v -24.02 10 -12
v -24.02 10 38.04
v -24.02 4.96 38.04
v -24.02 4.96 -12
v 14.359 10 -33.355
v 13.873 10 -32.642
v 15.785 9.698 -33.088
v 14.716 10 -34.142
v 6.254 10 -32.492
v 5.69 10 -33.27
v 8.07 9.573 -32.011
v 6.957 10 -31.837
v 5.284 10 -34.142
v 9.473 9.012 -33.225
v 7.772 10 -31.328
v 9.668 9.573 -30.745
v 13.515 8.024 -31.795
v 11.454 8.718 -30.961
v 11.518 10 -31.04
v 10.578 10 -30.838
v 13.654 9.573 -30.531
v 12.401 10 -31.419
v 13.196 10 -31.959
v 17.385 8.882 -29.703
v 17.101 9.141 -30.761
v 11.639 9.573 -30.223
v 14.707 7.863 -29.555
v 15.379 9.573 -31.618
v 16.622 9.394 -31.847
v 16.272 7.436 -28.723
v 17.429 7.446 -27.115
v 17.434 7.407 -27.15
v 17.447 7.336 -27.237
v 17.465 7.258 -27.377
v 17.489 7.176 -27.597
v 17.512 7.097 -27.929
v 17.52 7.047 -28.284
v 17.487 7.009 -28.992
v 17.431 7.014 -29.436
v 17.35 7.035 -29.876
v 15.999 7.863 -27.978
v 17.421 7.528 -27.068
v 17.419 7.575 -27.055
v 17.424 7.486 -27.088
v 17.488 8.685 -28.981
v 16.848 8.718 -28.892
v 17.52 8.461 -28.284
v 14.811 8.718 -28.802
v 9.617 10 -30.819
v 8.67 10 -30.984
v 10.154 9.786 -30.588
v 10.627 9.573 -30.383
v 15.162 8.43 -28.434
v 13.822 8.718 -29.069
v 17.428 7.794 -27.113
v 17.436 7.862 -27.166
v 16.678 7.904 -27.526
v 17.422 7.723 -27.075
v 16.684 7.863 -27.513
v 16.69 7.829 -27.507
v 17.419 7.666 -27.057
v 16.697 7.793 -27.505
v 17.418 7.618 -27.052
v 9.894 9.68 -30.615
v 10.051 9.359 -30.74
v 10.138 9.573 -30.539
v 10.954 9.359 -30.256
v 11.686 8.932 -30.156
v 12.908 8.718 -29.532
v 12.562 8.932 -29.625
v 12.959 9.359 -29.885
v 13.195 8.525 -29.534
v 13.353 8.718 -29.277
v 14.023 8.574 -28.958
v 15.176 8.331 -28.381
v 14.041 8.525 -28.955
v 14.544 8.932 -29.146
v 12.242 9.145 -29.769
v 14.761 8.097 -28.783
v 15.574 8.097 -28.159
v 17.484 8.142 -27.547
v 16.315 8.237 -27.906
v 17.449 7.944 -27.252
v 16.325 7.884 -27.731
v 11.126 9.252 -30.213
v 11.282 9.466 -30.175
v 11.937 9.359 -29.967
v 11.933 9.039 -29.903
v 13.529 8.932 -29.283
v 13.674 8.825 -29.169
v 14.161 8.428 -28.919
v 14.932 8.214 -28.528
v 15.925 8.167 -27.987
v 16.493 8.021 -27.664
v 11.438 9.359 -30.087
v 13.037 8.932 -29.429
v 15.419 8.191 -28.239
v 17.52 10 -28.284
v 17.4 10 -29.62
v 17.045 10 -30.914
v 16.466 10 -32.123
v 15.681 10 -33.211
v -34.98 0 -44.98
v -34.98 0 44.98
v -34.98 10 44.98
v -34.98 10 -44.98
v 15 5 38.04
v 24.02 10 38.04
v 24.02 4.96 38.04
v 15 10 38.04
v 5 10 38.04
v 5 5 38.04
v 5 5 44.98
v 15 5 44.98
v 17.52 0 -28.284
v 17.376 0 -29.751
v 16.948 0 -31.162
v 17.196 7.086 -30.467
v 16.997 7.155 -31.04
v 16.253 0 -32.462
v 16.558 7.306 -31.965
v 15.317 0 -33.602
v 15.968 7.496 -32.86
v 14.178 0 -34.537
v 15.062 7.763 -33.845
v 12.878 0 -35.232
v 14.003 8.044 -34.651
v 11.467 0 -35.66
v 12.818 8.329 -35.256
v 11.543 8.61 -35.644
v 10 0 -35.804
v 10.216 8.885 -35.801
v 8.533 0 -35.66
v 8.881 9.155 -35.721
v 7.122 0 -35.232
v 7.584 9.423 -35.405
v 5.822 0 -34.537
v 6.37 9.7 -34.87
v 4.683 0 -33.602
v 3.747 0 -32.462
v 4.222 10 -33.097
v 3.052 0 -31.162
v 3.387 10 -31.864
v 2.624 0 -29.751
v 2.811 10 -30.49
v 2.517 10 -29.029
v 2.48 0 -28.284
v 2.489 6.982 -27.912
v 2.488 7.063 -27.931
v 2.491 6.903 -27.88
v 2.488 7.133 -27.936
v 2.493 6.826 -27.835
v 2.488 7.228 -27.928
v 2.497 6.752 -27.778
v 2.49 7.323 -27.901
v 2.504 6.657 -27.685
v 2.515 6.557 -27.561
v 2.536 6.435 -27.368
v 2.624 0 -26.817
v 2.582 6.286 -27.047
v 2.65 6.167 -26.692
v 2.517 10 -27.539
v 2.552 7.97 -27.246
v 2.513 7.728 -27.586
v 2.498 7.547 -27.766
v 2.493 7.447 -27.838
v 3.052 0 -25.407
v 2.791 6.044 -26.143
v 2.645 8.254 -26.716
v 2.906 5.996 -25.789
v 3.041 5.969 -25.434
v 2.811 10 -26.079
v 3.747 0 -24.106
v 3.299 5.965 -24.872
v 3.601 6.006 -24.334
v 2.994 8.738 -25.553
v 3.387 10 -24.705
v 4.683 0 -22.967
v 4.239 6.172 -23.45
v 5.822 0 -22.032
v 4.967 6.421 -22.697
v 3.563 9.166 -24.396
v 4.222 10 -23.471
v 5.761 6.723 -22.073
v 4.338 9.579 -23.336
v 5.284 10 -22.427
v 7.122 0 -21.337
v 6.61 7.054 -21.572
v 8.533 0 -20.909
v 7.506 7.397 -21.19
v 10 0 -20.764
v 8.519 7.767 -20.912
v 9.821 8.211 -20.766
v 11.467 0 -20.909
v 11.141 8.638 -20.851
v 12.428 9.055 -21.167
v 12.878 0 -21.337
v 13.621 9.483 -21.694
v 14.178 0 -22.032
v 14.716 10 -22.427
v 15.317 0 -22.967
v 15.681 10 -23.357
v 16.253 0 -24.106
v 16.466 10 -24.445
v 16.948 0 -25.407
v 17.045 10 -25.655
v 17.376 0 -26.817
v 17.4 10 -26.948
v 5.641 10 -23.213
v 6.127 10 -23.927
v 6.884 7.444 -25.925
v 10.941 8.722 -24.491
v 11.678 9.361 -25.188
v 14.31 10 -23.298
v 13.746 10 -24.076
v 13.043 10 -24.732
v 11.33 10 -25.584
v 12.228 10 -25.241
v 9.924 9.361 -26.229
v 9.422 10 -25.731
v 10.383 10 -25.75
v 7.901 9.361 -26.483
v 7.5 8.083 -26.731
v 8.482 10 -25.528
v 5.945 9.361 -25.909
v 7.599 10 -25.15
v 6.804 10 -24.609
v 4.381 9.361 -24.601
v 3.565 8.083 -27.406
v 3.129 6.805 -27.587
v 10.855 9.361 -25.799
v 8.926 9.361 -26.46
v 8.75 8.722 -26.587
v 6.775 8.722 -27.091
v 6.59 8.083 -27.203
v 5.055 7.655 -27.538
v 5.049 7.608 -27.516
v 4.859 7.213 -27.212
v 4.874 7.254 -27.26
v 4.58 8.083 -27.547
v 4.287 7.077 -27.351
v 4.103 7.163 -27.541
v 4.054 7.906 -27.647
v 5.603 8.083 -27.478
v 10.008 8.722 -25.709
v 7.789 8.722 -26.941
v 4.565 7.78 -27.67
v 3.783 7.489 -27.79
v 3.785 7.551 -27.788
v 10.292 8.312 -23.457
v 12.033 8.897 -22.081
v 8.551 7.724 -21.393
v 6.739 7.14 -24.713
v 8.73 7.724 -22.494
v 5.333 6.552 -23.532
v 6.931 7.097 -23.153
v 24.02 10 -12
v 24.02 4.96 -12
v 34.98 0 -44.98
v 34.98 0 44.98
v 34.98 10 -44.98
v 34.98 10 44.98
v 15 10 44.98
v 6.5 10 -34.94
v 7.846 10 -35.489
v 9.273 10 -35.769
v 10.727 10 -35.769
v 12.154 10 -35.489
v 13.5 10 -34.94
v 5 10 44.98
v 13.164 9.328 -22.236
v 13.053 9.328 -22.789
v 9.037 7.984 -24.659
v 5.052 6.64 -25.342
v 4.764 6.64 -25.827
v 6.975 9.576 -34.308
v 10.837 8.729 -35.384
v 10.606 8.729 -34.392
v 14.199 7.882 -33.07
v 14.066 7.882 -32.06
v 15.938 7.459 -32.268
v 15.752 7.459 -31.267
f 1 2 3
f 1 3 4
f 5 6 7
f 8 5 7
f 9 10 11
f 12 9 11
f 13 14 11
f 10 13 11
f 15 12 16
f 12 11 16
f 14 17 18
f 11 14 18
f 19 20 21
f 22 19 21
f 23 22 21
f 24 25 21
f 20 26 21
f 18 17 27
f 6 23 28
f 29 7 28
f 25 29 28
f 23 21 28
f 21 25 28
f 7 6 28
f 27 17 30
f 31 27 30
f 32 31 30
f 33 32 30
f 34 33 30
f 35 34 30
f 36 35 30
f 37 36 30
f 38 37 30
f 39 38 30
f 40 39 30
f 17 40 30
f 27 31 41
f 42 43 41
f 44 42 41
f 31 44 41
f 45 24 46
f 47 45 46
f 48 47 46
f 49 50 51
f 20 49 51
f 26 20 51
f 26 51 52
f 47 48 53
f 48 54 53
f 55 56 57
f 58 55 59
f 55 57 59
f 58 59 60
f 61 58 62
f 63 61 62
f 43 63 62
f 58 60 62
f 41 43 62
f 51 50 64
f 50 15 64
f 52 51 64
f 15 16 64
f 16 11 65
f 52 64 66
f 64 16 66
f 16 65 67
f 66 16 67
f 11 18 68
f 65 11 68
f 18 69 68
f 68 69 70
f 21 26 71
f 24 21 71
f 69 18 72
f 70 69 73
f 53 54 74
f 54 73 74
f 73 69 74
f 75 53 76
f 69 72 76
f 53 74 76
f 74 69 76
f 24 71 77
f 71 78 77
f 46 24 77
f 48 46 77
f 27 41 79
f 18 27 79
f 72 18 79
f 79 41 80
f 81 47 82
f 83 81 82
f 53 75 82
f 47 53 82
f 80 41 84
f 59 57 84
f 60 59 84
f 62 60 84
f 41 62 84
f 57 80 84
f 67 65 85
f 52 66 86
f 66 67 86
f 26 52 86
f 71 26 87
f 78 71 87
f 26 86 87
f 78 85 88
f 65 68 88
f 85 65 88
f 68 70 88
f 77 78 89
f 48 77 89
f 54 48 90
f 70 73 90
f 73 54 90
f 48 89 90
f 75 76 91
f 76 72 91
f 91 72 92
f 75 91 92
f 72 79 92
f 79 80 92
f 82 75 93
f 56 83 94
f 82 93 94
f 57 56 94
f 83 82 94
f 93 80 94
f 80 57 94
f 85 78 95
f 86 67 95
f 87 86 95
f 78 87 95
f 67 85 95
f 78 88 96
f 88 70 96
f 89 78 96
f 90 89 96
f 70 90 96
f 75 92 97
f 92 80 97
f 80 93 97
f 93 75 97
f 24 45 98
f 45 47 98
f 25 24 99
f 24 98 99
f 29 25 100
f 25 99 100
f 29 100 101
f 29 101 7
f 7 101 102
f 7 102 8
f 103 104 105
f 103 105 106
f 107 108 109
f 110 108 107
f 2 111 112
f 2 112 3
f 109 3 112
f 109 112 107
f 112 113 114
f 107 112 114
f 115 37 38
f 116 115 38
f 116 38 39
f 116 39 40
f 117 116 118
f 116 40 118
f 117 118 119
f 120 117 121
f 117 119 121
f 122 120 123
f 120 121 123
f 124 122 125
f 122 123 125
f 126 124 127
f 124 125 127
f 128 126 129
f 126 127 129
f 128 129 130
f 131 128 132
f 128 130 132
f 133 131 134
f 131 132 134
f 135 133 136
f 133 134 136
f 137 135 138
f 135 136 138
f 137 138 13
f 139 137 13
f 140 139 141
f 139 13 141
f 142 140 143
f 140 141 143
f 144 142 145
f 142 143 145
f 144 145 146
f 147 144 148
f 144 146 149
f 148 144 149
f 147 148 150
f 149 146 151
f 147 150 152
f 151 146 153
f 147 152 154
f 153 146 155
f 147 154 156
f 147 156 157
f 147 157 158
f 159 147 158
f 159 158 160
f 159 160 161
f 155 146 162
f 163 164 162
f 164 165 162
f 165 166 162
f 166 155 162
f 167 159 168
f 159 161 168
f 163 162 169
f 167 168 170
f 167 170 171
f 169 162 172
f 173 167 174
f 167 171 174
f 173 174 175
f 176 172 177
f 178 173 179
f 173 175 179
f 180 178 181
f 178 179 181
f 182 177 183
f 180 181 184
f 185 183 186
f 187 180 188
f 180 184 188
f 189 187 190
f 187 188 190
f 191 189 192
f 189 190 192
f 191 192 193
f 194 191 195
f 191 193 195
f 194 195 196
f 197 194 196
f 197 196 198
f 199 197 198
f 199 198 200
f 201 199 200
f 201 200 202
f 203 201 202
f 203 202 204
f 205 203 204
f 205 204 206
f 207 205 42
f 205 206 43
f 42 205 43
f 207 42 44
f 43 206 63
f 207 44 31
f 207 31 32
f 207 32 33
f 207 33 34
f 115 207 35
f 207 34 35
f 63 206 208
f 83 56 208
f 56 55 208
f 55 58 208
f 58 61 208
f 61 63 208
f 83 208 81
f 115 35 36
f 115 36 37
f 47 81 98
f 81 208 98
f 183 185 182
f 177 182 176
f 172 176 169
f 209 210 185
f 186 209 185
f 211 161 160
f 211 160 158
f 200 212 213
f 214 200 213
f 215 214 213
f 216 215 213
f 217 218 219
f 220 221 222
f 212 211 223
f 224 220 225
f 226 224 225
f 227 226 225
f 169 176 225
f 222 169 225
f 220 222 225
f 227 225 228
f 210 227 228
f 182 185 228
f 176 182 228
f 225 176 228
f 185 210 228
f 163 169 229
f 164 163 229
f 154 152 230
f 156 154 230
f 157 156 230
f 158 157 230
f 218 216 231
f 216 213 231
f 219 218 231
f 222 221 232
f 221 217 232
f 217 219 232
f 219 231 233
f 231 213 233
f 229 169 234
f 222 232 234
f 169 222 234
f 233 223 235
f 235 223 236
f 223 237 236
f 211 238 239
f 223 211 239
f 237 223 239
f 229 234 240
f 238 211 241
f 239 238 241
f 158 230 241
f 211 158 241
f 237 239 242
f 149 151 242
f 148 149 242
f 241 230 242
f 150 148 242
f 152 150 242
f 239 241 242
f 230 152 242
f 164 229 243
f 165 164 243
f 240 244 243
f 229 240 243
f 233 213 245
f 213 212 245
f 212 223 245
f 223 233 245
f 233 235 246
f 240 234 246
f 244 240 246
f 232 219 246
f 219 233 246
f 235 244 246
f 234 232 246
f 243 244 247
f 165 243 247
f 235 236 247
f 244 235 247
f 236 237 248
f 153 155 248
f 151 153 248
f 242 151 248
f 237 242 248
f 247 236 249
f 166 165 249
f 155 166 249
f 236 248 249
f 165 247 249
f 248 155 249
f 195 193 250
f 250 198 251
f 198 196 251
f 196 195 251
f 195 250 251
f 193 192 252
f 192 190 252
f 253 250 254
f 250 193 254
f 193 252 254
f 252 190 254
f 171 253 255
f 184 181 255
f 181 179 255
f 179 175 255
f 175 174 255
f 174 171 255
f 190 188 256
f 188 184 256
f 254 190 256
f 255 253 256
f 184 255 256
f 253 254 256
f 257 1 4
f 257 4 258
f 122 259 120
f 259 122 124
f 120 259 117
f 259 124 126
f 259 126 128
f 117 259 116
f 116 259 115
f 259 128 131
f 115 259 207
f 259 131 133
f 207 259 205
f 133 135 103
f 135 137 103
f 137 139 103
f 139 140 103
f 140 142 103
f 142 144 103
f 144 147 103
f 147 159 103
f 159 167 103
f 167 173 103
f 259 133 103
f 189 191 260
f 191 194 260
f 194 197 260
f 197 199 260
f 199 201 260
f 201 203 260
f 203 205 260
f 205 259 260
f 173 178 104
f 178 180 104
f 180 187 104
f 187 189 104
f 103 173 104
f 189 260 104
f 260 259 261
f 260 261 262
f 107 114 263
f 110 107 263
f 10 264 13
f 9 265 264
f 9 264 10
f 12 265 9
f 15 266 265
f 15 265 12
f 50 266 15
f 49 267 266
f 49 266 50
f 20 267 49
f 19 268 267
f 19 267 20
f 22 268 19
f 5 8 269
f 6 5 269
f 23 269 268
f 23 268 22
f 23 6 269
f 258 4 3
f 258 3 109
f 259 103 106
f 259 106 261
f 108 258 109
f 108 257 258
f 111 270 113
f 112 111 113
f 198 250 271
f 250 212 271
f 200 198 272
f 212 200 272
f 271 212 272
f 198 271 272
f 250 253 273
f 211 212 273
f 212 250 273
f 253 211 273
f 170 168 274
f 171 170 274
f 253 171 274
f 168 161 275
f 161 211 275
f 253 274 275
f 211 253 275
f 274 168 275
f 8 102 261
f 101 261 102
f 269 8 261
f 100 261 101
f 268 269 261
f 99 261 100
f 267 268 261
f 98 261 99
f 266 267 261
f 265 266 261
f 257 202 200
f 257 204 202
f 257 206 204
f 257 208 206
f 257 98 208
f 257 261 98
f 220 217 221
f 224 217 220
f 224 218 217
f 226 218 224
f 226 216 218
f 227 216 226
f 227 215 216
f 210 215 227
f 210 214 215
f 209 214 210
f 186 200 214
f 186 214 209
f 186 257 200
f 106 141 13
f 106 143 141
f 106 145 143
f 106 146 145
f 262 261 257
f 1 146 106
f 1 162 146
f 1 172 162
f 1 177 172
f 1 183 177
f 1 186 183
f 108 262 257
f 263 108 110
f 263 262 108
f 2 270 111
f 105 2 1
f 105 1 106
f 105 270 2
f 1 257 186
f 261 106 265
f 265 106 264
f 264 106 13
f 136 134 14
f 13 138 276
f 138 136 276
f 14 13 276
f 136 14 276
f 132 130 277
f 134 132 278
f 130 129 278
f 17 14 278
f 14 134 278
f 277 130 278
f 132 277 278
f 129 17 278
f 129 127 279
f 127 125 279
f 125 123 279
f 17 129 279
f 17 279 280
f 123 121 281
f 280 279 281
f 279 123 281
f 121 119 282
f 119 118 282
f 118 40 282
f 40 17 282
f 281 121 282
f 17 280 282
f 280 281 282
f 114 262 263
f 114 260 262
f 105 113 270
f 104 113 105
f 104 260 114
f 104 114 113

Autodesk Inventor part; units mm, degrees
ref_plane "YZ Plane" through (0, 0, 0) normal (1, 0, 0) x (0, 1, 0)
ref_plane "XZ Plane" through (0, 0, 0) normal (0, 1, 0) x (-1, 0, 0)
ref_plane "XY Plane" through (0, 0, 0) normal (0, 0, 1) x (1, 0, 0)
sketch "Sketch1" plane through (0, 0, 0) normal (0, 1, 0) x (-1, 0, 0)
  line L0 (-34.98, 44.98) -> (34.98, 44.98)
  line L1 (34.98, 44.98) -> (34.98, -44.98)
  line L2 (34.98, -44.98) -> (-34.98, -44.98)
  line L3 (-34.98, -44.98) -> (-34.98, 44.98)
  line L4 (-34.98, 44.98) -> (34.98, -44.98) construction
  line L5 (34.98, 44.98) -> (-34.98, -44.98) construction
  point P0 (0, 0)
  dimension "d0" = 89.96
  dimension "d1" = 69.96
extrude "Extrusion1" add sketch "Sketch1" along normal blind 10
sketch "Sketch2" plane through (0, 10, 0) normal (0, 1, 0) x (1, 0, 0)
  circle A0 centre (10, 28.2843) radius 7.52
  line L0 (-34.98, 44.98) -> (-34.98, -44.98) projected
  point P0 (0, 0)
  dimension "d4" = 30
  dimension "d5" = 15.04
  dimension "d6" = 44.98
sketch "Sketch3" plane through (0, 10, 0) normal (0, 1, 0) x (1, 0, 0)
  line L0 (24.02, -38.04) -> (-24.02, -38.04)
  line L1 (-24.02, -38.04) -> (-24.02, 12)
  line L2 (-24.02, 12) -> (24.02, 12)
  line L3 (24.02, 12) -> (24.02, -38.04)
  line L4 (24.02, -38.04) -> (-24.02, 12) construction
  line L5 (-24.02, -38.04) -> (24.02, 12) construction
  point P0 (0, 0)
  point P1 (0, -13.02)
  dimension "d9" = 12
  dimension "d10" = 50.04
  dimension "d11" = 48.04
  dimension "d12" = 0
extrude "Extrusion3" cut sketch "Sketch3" against normal blind 5.04
extrude "Extrusion4" cut sketch "Sketch2" against normal through all
sketch "Sketch6" plane through (-34.98, 0, 44.98) normal (0, 0, 1) x (1, 0, 0)
  line L0 (39.98, 5) -> (49.98, 5)
  line L1 (49.98, 5) -> (49.98, 15)
  line L2 (49.98, 15) -> (39.98, 15)
  line L3 (39.98, 15) -> (39.98, 5)
  line L4 (37.46, 10) -> (52.5, 10) projected
  line L5 (39.98, 5) -> (49.98, 15) construction
  line L6 (49.98, 5) -> (39.98, 15) construction
  point P0 (34.98, 0)
  point P1 (44.98, 10)
  dimension "d29" = 10
  dimension "d30" = 10
extrude "Extrusion5" cut sketch "Sketch6" against normal blind 33
sketch "Sketch7" plane through (0, 10, 0) normal (0, 1, 0) x (1, 0, 0)
  circle A0 centre (10, 28.2843) radius 7.52 projected
  circle A1 centre (10, 35.8043) radius 5
  circle A2 centre (10, 20.7643) radius 5
  point P0 (0, 0)
  dimension "d34" = 10
  dimension "d35" = 10
  dimension "d36" = 15.04
coil "Coil2" sketch "Sketch7" operation add axis through (0, -10, 0) along (0, -1, 0) pitch 50 turns 0.2 hand left contours A2 A0 | A0 A2
sketch "Sketch8" plane through (0, 10, 0) normal (0, 1, 0) x (1, 0, 0)
  arc A0 (14.7156, 22.4265) -> (5.2844, 22.4265) centre (10, 28.2843) ccw projected
  circle A1 centre (10, 35.8043) radius 5
  point P0 (0, 0)
  point P1 (10, 35.8043)
  dimension "d45" = 10
coil "Coil3" sketch "Sketch8" operation add axis through (0, -10, 0) along (0, -1, 0) pitch 50 turns 0.2 hand right
sketch "Sketch9" plane through (34.98, 0, -44.98) normal (1, 0, 0) x (0, 0, -1)
  line L0 (-89.96, 10) -> (0, 10) projected
  line L1 (0, 0) -> (-38.9181, 0) projected
  line L2 (-89.96, 10) -> (0, 10)
  line L3 (0, 10) -> (0, 0)
  line L4 (0, 0) -> (-89.96, 0)
  line L5 (-89.96, 0) -> (-89.96, 10)
  point P0 (-44.98, 0)
extrude "Extrusion6" cut sketch "Sketch9" along normal blind 20
